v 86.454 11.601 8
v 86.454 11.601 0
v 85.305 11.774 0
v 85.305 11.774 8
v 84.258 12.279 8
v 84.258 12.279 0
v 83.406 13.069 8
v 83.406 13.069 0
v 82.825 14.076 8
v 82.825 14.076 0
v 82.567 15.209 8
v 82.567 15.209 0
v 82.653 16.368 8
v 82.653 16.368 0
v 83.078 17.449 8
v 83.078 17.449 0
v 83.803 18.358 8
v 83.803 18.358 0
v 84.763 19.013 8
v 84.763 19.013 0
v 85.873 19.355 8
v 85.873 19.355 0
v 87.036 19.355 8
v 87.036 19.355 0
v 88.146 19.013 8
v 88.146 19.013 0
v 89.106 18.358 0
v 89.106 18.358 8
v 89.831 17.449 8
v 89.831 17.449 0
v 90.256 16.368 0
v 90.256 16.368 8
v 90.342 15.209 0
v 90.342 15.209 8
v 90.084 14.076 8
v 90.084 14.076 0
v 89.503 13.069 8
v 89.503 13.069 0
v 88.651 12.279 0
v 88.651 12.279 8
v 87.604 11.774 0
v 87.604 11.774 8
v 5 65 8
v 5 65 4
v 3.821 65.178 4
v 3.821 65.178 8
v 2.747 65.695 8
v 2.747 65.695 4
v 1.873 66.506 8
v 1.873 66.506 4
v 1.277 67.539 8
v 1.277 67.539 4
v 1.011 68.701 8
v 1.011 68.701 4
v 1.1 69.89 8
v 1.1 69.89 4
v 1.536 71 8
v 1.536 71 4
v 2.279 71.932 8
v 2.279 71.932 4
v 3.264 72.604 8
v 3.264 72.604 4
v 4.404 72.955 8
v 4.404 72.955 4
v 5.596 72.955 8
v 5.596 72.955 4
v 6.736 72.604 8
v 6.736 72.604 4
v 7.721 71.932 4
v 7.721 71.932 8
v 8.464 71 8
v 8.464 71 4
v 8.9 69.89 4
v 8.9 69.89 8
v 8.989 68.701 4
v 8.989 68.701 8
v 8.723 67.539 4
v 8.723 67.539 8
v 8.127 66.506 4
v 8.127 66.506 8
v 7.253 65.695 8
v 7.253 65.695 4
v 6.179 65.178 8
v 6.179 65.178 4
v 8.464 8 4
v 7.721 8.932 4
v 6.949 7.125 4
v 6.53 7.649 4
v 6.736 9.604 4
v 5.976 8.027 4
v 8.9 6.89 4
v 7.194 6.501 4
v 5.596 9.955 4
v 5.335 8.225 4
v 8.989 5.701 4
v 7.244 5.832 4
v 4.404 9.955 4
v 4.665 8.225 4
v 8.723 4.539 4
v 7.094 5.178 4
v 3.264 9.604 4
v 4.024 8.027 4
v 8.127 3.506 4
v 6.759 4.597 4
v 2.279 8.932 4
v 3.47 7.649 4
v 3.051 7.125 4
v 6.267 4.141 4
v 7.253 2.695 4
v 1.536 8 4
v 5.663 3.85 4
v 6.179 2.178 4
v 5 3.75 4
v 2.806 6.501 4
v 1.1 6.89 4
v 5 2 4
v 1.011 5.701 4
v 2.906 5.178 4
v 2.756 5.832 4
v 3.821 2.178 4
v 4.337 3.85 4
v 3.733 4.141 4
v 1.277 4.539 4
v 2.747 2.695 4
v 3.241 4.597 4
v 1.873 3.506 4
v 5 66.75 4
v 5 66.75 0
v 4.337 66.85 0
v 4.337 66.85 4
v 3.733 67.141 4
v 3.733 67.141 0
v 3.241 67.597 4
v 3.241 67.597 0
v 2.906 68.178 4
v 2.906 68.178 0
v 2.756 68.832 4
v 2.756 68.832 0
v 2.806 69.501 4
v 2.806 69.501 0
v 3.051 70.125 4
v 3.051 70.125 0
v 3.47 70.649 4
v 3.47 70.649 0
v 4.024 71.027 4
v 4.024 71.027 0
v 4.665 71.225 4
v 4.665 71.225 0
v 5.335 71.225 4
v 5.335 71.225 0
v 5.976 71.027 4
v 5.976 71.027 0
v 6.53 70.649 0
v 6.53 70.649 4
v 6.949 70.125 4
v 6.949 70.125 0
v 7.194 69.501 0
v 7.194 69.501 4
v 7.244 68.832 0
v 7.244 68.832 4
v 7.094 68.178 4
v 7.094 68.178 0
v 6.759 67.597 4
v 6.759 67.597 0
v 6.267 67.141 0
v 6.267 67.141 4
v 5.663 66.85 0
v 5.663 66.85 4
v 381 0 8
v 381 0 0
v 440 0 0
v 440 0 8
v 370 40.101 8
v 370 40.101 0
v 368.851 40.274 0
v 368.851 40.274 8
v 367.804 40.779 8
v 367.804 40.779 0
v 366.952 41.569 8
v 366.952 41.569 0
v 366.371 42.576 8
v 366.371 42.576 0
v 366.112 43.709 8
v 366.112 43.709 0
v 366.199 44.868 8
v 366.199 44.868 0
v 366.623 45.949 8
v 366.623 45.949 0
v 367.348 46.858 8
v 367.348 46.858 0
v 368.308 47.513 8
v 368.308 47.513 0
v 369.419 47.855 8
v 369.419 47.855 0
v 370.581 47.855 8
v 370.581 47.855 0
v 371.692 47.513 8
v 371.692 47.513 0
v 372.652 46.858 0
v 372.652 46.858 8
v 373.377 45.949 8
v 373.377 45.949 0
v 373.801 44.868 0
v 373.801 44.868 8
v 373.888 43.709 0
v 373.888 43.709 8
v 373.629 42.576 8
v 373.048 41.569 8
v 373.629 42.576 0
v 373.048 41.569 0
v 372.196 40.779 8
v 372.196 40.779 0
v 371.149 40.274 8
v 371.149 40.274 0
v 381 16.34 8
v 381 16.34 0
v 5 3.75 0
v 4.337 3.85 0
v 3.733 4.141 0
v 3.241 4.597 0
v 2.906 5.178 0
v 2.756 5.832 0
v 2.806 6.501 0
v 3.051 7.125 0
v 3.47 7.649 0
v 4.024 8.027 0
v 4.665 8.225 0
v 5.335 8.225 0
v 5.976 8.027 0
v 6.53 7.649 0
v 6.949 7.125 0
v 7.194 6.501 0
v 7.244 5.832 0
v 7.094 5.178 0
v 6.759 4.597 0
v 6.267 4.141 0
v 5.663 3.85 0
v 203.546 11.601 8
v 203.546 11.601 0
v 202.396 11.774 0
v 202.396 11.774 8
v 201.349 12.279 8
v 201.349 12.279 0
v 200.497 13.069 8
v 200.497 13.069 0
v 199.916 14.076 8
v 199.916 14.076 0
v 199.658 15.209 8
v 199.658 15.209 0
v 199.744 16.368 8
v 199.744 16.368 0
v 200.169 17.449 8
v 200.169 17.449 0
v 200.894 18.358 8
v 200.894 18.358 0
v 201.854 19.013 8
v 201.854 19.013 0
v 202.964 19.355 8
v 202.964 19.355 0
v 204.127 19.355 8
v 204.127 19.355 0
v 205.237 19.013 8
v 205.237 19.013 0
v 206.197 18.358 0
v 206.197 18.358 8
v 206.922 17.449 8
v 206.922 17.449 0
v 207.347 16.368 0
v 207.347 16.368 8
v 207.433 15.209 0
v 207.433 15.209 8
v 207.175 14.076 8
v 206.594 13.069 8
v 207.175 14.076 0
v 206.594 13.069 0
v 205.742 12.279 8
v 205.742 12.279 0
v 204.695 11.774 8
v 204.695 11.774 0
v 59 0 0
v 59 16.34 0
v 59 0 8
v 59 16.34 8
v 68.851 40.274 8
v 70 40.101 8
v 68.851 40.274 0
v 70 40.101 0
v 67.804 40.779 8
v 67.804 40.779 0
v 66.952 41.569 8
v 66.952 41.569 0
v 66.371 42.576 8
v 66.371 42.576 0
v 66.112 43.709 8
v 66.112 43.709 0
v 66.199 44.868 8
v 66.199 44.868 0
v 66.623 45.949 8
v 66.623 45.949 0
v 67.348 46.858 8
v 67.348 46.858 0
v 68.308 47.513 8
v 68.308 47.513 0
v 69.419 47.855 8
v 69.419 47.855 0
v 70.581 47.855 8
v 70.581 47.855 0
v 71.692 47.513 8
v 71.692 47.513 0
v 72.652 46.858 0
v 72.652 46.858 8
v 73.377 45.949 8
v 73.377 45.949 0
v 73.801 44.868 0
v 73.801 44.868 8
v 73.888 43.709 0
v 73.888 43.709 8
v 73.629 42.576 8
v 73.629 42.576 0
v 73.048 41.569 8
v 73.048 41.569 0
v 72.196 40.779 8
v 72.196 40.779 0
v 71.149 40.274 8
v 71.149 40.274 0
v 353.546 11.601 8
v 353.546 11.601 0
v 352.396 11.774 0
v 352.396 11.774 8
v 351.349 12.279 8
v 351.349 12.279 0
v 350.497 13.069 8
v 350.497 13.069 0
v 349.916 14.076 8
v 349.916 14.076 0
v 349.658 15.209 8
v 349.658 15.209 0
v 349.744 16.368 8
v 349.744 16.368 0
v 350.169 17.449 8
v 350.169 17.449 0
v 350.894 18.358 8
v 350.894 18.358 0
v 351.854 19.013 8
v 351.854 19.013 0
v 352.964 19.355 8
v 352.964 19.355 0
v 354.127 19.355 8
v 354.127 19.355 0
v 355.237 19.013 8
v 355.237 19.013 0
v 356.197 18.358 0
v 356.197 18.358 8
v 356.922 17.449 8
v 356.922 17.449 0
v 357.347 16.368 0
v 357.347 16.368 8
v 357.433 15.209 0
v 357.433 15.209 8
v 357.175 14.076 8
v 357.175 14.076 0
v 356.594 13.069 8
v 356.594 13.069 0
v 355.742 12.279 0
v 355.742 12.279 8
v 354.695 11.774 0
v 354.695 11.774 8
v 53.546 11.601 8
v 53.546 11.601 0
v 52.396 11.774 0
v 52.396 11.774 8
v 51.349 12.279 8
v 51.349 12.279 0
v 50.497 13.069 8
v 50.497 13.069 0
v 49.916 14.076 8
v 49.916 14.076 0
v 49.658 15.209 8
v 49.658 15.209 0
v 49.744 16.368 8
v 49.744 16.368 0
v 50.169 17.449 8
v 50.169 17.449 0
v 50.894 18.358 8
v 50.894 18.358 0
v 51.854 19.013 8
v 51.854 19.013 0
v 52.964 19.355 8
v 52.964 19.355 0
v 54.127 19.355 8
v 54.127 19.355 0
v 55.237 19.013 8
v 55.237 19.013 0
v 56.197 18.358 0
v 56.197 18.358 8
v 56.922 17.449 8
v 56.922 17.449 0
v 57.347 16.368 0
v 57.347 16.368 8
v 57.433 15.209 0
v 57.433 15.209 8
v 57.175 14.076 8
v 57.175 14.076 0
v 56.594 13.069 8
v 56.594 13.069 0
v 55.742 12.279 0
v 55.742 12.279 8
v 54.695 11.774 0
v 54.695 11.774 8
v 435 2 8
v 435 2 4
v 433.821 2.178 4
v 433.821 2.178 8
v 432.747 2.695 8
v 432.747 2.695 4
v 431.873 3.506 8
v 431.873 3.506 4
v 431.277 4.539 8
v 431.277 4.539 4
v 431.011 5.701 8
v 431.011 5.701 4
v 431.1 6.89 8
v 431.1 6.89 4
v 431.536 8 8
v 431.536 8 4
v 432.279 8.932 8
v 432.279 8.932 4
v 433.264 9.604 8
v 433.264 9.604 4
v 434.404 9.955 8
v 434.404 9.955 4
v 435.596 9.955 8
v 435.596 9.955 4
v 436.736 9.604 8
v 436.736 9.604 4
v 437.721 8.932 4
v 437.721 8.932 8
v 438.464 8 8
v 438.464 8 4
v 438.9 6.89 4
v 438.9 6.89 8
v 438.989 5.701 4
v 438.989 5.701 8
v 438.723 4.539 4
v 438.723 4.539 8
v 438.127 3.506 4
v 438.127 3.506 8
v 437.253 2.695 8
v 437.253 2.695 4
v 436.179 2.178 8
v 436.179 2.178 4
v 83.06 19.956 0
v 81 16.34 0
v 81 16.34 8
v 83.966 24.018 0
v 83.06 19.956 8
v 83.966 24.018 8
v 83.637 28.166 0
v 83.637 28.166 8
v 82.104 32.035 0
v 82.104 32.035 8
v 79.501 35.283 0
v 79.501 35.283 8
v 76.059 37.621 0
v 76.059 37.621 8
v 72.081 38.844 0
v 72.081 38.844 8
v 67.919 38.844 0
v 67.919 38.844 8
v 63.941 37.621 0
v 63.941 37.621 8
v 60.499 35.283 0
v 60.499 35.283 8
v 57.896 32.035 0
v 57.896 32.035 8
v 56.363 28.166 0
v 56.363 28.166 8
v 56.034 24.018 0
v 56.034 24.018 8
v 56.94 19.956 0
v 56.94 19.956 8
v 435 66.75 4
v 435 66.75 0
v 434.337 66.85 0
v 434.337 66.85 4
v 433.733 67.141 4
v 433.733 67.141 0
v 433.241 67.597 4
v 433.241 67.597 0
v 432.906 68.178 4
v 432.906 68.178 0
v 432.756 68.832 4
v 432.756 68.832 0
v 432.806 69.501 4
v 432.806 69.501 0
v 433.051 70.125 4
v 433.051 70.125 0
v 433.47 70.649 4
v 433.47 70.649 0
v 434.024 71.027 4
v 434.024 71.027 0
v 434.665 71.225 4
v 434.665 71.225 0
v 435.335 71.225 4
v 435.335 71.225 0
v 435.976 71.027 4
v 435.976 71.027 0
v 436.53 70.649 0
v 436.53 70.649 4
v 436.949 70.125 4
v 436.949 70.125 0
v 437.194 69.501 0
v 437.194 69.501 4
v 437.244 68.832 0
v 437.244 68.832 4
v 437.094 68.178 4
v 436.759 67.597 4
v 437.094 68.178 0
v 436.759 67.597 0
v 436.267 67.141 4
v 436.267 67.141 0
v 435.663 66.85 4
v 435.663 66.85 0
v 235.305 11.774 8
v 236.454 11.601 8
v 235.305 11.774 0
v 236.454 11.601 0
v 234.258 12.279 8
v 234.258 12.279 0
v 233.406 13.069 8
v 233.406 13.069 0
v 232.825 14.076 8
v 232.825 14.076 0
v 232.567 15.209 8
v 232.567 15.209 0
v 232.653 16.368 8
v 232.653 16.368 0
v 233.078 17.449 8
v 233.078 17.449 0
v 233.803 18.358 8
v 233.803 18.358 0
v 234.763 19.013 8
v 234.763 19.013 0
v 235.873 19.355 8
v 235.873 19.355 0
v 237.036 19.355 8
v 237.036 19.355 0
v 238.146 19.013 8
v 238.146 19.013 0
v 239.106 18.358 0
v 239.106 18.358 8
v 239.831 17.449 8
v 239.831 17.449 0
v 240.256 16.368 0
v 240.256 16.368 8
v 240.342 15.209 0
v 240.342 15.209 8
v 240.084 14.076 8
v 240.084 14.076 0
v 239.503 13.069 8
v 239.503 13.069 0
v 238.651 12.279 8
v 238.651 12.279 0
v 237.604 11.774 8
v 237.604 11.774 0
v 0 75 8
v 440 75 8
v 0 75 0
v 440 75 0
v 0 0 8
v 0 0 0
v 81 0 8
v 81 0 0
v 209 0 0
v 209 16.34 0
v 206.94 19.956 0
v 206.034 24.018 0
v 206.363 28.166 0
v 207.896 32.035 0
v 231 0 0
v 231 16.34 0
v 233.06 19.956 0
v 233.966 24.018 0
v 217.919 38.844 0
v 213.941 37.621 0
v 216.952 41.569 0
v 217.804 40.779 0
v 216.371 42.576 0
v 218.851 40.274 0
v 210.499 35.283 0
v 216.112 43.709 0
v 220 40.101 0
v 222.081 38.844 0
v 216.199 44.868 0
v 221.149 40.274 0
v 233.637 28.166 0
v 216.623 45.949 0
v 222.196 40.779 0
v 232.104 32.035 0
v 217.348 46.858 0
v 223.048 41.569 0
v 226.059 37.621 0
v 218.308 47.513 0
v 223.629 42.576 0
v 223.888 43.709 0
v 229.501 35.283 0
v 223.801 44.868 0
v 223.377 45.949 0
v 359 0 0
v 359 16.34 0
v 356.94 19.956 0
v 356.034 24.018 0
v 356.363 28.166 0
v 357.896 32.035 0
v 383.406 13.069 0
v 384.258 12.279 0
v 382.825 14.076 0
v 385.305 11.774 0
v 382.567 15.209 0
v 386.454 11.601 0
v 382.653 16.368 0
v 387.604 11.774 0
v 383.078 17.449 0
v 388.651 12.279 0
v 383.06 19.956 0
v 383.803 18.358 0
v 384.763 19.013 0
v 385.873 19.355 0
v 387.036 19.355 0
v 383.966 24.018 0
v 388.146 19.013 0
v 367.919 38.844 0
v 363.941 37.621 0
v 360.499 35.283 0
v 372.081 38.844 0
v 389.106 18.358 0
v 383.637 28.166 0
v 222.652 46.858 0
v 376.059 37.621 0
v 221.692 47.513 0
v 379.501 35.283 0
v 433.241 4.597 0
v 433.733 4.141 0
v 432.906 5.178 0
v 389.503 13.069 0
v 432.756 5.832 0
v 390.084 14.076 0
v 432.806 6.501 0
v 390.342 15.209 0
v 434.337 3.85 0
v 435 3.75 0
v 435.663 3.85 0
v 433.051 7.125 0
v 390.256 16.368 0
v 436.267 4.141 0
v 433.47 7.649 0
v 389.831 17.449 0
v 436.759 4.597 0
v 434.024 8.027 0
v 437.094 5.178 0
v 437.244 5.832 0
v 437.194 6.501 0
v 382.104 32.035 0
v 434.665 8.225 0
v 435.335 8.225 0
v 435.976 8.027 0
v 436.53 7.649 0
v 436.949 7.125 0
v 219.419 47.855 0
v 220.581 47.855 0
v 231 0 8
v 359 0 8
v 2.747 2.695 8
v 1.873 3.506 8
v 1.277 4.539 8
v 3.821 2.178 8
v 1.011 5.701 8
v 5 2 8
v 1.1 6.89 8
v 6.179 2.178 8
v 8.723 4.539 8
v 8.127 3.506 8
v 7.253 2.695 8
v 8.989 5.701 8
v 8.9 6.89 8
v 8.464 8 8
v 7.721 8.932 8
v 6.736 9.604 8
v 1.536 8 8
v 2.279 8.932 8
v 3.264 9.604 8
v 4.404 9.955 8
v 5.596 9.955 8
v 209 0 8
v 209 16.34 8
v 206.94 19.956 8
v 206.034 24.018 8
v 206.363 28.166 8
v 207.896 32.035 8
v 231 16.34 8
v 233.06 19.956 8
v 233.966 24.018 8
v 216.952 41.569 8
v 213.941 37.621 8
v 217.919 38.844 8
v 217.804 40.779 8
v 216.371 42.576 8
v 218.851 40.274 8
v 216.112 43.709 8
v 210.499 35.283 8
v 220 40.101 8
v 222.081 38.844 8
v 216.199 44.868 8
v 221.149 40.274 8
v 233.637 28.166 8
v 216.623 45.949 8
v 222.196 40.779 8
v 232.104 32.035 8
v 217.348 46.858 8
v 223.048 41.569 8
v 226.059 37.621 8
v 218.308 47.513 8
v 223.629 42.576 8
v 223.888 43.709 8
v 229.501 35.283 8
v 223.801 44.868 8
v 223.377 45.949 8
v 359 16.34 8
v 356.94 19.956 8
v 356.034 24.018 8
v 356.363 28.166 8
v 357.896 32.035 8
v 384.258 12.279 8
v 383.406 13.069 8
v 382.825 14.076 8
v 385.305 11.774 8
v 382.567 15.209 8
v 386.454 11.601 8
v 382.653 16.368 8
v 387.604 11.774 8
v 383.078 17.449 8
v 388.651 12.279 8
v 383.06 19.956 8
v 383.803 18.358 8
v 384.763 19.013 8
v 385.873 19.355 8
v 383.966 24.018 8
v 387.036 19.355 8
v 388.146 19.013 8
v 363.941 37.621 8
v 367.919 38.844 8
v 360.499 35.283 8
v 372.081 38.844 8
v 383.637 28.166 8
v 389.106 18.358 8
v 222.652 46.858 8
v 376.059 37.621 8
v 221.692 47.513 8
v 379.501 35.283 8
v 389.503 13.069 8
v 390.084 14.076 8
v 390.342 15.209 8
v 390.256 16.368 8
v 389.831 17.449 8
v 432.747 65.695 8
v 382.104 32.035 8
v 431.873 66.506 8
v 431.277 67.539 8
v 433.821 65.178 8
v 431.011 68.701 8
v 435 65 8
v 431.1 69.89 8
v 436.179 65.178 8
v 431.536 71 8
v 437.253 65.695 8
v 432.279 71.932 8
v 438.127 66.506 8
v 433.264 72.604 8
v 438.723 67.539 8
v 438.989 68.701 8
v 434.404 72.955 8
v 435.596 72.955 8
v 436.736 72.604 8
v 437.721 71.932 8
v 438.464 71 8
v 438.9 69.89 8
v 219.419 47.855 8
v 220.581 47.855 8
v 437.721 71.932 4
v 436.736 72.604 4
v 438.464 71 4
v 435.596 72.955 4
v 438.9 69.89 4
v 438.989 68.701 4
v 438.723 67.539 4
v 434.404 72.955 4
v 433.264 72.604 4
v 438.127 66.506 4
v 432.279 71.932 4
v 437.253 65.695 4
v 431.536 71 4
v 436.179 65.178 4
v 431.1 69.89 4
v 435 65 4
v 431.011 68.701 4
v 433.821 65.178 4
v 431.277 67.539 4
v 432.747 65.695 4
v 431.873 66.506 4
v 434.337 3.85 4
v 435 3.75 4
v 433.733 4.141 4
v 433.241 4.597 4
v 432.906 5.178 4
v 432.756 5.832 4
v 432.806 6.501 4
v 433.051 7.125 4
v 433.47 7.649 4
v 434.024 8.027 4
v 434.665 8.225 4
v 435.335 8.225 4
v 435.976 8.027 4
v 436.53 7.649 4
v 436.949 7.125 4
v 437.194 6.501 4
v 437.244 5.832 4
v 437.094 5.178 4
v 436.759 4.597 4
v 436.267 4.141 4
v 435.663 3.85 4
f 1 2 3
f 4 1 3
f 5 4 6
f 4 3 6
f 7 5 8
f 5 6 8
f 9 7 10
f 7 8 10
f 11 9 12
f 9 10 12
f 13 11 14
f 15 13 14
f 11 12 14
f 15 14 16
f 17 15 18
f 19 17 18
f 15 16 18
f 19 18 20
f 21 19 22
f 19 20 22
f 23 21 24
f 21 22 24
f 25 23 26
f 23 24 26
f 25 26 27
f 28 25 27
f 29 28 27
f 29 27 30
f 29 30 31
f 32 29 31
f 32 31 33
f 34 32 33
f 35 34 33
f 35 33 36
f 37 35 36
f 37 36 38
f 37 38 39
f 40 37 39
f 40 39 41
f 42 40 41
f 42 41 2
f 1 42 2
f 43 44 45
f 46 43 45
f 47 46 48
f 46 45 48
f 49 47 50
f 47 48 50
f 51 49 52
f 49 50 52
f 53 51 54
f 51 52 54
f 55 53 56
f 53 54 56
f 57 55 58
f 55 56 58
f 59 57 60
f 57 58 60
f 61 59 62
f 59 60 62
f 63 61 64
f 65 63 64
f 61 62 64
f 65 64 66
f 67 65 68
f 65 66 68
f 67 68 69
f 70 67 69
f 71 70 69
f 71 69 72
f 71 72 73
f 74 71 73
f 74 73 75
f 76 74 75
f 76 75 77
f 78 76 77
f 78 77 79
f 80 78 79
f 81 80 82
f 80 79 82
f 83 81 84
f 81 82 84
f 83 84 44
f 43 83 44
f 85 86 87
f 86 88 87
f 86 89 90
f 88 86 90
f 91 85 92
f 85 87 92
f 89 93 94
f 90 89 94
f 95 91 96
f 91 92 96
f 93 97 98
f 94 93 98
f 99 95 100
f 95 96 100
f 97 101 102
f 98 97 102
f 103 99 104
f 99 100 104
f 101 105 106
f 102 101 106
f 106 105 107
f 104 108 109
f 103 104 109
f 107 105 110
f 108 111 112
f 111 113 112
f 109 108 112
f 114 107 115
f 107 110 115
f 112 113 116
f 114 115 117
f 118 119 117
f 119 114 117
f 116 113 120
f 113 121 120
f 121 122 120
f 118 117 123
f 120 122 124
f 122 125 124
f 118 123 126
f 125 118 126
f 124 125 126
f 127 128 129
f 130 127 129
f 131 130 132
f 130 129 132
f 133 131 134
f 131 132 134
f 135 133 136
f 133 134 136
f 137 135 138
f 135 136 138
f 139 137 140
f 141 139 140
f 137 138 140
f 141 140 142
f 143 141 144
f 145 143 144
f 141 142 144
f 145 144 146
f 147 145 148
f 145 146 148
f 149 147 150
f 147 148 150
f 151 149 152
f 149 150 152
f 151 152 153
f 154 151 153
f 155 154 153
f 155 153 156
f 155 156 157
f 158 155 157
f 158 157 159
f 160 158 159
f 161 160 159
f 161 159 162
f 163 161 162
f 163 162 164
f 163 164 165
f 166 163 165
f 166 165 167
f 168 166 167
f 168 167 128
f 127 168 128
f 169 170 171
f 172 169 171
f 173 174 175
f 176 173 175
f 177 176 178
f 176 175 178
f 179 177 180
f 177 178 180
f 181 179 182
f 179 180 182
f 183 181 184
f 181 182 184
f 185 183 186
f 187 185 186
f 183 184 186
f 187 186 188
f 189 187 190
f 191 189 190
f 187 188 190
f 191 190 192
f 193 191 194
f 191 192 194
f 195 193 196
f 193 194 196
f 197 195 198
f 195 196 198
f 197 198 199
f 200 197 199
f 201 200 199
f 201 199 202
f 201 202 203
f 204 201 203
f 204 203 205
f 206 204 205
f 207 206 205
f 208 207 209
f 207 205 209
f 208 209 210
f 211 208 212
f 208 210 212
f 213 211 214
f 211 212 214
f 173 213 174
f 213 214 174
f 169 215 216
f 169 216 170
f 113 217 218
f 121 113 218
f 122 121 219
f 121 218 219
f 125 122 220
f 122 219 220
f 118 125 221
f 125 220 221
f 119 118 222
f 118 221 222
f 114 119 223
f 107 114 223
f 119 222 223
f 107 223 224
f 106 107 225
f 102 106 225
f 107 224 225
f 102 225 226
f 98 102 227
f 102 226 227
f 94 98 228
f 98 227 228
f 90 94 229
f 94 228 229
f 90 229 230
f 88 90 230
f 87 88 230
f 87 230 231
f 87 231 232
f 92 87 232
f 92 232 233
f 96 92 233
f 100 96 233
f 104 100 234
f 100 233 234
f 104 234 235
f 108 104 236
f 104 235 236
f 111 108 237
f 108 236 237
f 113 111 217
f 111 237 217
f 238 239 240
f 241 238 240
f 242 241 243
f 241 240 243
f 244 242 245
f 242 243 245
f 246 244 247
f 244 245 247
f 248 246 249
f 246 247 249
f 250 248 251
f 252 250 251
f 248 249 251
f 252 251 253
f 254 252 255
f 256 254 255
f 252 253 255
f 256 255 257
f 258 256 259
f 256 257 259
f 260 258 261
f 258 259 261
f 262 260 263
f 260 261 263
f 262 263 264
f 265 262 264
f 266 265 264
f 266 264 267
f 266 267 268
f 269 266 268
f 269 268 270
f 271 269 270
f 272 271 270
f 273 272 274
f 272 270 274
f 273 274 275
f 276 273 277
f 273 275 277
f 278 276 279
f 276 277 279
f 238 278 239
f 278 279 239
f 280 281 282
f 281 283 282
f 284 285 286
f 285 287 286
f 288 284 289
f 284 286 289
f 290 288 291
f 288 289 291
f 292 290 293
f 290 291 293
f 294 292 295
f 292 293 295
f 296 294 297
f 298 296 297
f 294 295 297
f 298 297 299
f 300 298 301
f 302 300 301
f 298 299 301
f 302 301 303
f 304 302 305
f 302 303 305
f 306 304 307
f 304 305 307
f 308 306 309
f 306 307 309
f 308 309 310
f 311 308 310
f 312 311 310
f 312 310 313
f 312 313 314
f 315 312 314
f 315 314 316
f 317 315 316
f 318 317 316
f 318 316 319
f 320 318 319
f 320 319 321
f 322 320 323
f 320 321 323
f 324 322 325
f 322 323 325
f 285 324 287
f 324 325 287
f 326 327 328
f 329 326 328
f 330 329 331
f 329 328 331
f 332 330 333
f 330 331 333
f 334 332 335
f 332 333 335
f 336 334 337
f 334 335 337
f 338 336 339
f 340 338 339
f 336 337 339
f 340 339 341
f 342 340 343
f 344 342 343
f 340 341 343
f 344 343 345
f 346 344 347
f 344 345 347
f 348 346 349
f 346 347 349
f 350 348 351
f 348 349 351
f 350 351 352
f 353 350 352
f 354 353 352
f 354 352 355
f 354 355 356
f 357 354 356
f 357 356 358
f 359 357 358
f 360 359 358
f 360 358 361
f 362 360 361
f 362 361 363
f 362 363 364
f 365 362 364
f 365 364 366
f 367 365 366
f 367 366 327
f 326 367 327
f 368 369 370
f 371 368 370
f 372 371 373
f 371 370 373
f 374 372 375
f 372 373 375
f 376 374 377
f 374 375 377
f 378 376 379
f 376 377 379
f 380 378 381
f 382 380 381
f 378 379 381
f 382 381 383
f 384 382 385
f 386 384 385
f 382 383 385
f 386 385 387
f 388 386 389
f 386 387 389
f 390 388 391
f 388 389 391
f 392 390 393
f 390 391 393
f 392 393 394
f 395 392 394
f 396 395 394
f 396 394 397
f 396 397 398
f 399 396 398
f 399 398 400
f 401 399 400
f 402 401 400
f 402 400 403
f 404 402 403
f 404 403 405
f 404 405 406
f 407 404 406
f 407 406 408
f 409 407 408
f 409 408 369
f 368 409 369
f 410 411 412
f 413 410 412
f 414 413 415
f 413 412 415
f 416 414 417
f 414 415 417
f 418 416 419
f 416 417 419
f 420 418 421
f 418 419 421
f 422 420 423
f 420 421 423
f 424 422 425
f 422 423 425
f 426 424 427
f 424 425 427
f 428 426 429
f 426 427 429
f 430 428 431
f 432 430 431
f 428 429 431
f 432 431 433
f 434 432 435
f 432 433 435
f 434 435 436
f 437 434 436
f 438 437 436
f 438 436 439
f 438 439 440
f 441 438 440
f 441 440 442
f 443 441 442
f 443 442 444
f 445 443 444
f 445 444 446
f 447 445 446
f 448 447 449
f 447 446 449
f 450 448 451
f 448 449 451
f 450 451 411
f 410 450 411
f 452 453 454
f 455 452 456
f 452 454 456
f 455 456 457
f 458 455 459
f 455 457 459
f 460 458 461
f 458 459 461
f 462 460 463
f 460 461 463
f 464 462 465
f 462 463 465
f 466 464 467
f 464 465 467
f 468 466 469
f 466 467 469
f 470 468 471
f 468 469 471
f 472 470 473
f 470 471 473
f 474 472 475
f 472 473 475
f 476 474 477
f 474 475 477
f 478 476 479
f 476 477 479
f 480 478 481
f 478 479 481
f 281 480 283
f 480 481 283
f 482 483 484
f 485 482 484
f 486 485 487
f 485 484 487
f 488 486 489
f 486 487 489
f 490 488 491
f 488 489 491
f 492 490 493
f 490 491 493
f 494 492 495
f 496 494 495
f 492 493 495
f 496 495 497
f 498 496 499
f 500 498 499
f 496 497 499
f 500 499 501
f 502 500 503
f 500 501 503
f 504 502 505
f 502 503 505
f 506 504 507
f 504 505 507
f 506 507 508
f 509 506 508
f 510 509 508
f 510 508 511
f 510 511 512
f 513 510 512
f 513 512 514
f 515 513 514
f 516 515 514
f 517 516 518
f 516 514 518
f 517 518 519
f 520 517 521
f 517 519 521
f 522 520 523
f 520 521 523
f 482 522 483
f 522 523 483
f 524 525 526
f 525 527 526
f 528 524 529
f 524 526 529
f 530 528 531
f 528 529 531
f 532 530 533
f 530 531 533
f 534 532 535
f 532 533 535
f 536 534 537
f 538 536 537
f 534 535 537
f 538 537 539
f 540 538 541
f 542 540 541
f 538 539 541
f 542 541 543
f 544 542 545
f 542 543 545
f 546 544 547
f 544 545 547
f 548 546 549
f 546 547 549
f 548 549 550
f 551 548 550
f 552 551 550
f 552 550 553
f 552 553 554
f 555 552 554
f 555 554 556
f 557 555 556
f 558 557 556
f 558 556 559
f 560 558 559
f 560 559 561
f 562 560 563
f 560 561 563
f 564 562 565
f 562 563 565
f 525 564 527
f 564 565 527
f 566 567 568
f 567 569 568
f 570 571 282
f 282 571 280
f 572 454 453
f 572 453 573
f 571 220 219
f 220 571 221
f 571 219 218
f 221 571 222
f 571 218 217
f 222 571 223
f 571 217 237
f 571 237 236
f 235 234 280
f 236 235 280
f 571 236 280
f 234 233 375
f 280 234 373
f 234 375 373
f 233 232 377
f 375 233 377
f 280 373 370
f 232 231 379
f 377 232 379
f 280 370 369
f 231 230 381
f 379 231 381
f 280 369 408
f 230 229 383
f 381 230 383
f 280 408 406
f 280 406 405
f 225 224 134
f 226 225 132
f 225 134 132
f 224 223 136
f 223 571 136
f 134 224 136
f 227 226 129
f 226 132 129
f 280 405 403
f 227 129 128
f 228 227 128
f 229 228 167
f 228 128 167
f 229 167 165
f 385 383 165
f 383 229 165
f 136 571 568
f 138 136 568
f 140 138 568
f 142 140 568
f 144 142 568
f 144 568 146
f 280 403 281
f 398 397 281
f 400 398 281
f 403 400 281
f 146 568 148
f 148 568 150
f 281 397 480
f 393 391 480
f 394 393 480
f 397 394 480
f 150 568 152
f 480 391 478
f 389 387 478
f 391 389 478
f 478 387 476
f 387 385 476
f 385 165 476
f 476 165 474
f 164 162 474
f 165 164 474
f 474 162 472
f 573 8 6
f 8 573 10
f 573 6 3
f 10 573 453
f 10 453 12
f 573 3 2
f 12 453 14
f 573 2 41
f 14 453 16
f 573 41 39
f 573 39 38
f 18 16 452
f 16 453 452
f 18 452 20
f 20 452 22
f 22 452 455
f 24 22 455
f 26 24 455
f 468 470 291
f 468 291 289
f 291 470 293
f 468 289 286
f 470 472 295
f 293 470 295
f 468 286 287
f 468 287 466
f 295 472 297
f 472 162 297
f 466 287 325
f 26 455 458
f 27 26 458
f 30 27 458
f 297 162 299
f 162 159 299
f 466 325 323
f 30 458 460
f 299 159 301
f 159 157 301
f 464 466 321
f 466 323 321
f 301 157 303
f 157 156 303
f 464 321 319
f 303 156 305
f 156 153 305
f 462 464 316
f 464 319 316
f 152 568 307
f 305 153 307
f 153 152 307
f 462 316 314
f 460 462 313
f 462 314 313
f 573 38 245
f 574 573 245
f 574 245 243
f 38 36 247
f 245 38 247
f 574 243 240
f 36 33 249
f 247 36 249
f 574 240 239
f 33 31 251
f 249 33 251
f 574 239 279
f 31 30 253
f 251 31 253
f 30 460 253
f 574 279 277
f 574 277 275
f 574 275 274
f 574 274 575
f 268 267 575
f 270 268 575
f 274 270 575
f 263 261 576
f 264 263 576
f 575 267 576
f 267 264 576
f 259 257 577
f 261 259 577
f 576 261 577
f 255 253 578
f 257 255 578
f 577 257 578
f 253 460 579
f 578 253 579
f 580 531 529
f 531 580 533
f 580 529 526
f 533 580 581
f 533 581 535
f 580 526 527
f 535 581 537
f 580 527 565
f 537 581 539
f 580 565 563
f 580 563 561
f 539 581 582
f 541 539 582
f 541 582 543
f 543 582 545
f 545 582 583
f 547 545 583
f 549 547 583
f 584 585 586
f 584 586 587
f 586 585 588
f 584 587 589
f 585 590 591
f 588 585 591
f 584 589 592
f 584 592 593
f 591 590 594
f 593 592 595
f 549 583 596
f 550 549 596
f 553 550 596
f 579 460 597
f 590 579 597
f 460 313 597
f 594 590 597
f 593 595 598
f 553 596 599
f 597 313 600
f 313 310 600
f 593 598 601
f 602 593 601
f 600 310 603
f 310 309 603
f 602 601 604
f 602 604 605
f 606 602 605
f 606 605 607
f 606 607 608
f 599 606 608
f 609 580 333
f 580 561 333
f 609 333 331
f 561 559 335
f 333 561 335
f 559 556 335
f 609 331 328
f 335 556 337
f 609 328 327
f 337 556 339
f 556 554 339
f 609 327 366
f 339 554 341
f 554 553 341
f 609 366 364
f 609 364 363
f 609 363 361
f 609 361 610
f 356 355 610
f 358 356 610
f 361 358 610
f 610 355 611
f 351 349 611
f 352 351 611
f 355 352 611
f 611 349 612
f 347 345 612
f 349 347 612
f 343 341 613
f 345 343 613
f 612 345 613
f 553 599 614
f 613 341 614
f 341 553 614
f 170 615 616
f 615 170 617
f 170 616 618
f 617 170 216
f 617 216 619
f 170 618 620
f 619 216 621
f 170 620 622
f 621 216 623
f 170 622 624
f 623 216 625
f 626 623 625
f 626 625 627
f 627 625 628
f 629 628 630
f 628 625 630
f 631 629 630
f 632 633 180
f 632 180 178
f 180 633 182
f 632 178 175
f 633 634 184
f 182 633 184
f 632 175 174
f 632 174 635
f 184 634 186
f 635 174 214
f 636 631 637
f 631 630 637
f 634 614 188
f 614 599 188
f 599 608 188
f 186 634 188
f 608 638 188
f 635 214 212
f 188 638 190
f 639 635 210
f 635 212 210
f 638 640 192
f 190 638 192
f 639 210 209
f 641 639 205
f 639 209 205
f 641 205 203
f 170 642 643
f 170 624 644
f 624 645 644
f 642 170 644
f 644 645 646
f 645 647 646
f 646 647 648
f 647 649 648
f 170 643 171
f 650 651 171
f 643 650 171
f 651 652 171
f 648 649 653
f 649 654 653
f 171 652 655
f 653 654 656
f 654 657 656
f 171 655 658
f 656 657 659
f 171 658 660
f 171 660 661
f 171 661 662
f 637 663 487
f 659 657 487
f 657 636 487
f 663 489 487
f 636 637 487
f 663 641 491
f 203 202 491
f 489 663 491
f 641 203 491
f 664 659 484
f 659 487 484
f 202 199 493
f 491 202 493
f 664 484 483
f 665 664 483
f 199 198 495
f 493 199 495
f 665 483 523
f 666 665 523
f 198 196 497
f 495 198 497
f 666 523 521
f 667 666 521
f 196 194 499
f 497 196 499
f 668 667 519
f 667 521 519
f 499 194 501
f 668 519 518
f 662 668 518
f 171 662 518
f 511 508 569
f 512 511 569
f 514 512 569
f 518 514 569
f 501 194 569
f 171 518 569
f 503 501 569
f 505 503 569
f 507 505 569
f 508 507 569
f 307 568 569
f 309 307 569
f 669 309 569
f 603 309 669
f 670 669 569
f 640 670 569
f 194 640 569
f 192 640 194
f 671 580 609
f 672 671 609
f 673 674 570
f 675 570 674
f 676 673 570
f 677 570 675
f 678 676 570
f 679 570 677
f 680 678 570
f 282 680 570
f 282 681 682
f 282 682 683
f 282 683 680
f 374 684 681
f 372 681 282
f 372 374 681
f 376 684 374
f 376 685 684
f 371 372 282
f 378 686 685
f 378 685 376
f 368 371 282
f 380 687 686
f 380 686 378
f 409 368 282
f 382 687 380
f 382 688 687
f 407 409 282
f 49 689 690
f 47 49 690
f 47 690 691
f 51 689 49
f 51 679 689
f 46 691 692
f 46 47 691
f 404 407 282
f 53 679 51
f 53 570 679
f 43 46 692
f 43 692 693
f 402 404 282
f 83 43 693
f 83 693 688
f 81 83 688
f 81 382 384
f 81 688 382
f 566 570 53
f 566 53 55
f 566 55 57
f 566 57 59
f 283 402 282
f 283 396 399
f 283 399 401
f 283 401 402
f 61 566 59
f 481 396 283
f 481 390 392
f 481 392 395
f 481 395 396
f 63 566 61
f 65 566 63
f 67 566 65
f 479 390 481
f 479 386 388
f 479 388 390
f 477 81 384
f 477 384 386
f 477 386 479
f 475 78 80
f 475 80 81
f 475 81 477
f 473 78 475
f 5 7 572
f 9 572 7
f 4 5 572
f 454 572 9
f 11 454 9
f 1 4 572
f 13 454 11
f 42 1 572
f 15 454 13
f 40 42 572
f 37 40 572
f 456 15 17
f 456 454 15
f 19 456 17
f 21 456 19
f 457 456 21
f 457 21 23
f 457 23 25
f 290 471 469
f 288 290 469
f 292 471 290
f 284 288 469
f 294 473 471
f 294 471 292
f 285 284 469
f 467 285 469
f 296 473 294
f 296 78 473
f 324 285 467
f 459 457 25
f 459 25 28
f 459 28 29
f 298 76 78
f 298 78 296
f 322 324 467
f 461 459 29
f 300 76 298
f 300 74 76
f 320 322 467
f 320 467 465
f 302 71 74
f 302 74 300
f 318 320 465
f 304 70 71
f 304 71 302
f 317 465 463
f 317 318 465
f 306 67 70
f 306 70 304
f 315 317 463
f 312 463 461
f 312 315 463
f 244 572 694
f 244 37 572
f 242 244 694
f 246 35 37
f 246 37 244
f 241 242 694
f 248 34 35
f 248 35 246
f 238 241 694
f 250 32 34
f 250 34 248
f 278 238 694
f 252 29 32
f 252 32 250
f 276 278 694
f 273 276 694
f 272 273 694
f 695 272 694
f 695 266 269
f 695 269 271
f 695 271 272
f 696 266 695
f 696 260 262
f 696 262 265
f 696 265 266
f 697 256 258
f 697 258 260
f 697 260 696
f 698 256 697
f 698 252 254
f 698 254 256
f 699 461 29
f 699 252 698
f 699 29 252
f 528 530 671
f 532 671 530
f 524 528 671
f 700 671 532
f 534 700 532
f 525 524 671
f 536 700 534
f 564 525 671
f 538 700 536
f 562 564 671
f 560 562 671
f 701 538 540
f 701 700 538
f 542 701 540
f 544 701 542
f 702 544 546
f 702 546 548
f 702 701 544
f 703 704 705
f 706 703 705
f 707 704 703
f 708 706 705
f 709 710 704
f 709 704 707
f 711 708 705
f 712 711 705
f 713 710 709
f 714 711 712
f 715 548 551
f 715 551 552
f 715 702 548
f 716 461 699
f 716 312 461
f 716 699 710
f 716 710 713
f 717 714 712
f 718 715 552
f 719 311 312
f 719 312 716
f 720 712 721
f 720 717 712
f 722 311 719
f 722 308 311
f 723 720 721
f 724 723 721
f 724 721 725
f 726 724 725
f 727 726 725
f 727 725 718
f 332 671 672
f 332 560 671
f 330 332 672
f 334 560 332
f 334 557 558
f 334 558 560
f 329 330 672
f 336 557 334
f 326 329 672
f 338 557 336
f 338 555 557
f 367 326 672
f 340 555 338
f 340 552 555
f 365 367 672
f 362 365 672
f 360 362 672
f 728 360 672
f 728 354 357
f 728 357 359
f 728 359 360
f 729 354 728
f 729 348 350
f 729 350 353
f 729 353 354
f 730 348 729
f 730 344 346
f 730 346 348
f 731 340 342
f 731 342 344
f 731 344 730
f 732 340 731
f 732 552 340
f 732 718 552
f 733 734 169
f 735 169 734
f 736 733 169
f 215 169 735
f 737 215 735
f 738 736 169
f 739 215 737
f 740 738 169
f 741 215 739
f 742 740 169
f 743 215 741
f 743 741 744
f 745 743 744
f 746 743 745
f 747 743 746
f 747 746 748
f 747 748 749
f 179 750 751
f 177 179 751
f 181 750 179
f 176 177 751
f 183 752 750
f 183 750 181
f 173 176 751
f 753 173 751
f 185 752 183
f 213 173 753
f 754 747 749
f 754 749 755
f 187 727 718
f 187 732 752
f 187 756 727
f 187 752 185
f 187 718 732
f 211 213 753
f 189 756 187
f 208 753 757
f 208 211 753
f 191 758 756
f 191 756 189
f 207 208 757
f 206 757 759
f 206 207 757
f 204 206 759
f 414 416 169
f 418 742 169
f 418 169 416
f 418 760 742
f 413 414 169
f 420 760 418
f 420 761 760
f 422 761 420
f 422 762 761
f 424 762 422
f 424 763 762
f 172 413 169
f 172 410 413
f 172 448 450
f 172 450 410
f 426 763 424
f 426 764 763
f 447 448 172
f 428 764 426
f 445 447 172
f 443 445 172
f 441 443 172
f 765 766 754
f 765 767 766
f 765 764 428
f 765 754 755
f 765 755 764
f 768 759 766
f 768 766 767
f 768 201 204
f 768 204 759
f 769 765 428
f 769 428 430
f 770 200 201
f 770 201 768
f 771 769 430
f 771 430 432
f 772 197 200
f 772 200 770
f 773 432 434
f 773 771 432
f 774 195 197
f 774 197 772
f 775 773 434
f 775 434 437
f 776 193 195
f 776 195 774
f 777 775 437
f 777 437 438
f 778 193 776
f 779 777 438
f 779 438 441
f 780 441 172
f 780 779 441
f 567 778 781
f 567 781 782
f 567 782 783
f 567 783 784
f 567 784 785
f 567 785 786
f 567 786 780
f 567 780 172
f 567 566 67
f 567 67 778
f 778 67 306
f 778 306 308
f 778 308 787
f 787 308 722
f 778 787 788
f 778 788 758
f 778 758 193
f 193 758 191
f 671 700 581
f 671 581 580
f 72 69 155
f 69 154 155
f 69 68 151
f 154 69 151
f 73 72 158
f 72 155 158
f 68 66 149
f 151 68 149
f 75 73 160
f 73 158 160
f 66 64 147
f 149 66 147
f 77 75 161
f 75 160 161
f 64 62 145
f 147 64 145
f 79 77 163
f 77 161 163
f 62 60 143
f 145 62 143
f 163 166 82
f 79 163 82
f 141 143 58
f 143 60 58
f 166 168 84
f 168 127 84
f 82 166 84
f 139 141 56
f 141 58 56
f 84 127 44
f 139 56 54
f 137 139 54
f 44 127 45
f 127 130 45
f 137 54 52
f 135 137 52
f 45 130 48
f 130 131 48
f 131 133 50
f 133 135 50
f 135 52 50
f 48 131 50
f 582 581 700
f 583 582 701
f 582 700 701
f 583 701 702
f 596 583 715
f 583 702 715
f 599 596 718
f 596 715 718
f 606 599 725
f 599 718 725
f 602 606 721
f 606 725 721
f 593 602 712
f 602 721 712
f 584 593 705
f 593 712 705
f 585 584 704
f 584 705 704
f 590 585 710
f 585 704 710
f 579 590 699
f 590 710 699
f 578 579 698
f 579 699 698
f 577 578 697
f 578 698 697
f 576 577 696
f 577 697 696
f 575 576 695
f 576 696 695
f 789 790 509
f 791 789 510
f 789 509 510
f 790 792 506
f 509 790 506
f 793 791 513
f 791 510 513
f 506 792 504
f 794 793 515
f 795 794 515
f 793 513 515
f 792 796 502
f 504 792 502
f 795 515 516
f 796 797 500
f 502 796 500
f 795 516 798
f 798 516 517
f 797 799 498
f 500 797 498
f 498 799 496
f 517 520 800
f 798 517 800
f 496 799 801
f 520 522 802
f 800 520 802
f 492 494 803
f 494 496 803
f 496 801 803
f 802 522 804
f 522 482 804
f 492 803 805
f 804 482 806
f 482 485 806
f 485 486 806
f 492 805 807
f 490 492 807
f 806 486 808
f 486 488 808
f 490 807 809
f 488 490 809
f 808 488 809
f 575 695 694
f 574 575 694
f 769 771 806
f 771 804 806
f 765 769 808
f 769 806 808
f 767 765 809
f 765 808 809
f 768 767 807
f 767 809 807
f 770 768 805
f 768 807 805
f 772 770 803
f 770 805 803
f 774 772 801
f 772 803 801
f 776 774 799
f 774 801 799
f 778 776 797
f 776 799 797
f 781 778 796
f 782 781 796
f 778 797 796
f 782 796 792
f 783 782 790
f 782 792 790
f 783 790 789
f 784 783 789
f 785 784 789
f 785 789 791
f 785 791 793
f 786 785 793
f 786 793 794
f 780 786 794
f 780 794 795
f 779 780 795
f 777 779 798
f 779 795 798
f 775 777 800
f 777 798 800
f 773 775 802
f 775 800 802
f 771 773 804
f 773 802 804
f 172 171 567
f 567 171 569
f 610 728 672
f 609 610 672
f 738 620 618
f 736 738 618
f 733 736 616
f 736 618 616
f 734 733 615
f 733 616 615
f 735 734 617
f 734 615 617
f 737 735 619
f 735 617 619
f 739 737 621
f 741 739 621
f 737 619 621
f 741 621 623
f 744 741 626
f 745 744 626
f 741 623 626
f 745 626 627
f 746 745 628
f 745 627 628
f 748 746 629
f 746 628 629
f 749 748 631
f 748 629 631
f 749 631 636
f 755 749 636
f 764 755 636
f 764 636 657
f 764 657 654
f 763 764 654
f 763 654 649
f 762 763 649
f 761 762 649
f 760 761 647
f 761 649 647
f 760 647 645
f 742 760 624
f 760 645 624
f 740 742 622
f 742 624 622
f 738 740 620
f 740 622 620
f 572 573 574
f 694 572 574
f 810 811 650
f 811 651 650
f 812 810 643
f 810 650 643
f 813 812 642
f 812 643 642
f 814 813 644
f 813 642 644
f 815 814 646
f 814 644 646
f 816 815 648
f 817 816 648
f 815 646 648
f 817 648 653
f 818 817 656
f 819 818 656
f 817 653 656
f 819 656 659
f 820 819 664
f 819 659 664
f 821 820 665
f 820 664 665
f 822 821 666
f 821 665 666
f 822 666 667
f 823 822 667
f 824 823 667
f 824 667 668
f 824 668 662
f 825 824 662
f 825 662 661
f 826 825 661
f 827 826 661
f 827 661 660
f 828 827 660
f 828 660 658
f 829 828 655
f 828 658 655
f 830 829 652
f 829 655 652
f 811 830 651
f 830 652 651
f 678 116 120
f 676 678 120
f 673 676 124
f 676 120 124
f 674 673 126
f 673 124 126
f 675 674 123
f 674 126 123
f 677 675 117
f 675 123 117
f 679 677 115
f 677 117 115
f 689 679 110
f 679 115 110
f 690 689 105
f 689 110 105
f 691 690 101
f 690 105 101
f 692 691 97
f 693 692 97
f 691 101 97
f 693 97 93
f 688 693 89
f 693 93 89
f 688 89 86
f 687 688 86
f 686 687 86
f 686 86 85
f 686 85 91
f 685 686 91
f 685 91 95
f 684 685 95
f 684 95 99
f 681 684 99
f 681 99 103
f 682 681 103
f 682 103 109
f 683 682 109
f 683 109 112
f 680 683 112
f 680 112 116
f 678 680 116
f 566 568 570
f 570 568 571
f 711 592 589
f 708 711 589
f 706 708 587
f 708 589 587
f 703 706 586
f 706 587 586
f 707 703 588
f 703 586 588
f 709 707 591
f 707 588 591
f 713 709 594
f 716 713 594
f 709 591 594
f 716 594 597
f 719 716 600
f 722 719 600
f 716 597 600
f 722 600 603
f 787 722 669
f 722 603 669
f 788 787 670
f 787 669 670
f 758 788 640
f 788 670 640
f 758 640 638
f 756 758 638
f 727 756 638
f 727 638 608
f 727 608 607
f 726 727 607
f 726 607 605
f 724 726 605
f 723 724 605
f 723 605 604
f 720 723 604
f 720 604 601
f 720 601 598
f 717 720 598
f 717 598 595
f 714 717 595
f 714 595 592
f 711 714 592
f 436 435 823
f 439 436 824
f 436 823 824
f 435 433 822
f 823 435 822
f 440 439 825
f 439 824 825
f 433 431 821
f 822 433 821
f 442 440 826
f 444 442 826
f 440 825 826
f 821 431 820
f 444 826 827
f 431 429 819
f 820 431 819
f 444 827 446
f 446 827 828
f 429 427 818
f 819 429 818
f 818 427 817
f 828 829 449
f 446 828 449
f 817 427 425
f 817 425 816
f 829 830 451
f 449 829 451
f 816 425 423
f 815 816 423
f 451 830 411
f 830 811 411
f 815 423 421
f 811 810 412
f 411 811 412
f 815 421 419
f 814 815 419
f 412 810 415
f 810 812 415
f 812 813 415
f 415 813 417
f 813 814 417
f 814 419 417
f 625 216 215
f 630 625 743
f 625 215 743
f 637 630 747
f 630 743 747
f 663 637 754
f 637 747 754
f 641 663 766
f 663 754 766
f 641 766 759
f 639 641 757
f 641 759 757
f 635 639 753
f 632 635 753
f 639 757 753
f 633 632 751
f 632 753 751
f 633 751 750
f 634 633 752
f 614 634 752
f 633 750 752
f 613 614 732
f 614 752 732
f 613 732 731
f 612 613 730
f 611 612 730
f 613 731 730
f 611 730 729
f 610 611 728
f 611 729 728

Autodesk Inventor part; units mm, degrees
ref_plane "YZ Plane" through (0, 0, 0) normal (1, 0, 0) x (0, 1, 0)
ref_plane "XZ Plane" through (0, 0, 0) normal (0, 1, 0) x (-1, 0, 0)
ref_plane "XY Plane" through (0, 0, 0) normal (0, 0, 1) x (1, 0, 0)
sketch "Sketch1" plane through (0, 0, 0) normal (0, 0, 1) x (1, 0, 0)
  line L0 (0, 0) -> (440, 0)
  line L1 (440, 0) -> (440, 75)
  line L2 (440, 75) -> (0, 75)
  line L3 (0, 75) -> (0, 0)
  dimension "d0" = 75
  dimension "d1" = 440
extrude "Extrusion1" add sketch "Sketch1" along normal blind 8
sketch "Sketch2" plane through (0, 0, 8) normal (0, 0, 1) x (1, 0, 0)
  line L0 (0, 0) -> (0, 75) projected
  line L1 (440, 0) -> (0, 0) projected
  circle A0 centre (70, 25) radius 14
  line L2 (59, 16.3397) -> (59, 0)
  line L3 (81, 16.3397) -> (81, 0)
  circle A1 centre (220, 25) radius 14
  line L4 (209, 16.3397) -> (209, 0)
  line L5 (231, 16.3397) -> (231, 0)
  circle A2 centre (370, 25) radius 14
  line L6 (359, 16.3397) -> (359, 0)
  line L7 (381, 16.3397) -> (381, 0)
  line L8 (209, 0) -> (231, 0)
  line L9 (359, 0) -> (381, 0)
  line L10 (521.97, 0) -> (544.83, 0)
  line L11 (671.8667, 0) -> (697.23, 0)
  line L12 (826.77, 0) -> (849.63, 0)
  line L13 (674.37, 0) -> (697.23, 0)
  dimension "d4" = 22
  dimension "d5" = 11
  dimension "d7" = 25
  dimension "d8" = 28
  dimension "d9" = 70
  dimension "d17" = 150
  dimension "d58" = 440
extrude "Extrusion4" cut sketch "Sketch2" against normal up to next
sketch "Sketch3" plane through (0, 0, 8) normal (0, 0, 1) x (1, 0, 0)
  arc A0 (81, 16.3397) -> (59, 16.3397) centre (70, 25) ccw projected
  circle A1 centre (70, 25) radius 19
  line L0 (209, 0) -> (81, 0) projected
  point P0 (70, 44)
  point P1 (53.5455, 15.5)
  point P2 (86.4545, 15.5)
  point P3 (220, 44)
  point P4 (236.4545, 15.5)
  point P5 (203.5455, 15.5)
  point P6 (370, 44)
  point P7 (386.4545, 15.5)
  point P8 (353.5455, 15.5)
  dimension "d59" = 38
  dimension "d62" = 360
  dimension "d66" = 150
hole "Hole1" at (70, 44, 8) at (86.4545, 15.5, 8) at (53.5455, 15.5, 8) at (203.5455, 15.5, 8) at (236.4545, 15.5, 8) at (220, 44, 8) at (353.5455, 15.5, 8) at (370, 44, 8) at (386.4545, 15.5, 8) direction (0, 0, -1) diameter 7.7978 end through all thread size "3/8-16 UNC" class "2B" standard "ANSI Unified Screw Threads"
sketch "Sketch4" plane through (0, 0, 8) normal (0, 0, 1) x (1, 0, 0)
  line L0 (440, 75) -> (440, 0) projected
  line L1 (0, 0) -> (0, 75) projected
  line L2 (440, 0) -> (0, 0) projected
  point P0 (59, 0)
  point P1 (5, 69)
  point P2 (5, 6)
  point P3 (435, 6)
  point P4 (435, 69)
  dimension "d42" = 6
  dimension "d44" = 5
  dimension "d45" = 5
  dimension "d71" = 69
hole "Hole2" at (5, 69, 8) at (5, 6, 8) at (435, 6, 8) at (435, 69, 8) direction (0, 0, -1) diameter 4.5 end through all counterbore diameter 8 counterbore depth 4 clearance for "Socket Head Cap Screw" size "M4" standard "Ansi Metric M Profile"
equation "\"d4\" = 2 * d5"
equation "\"d9\" = -d17 + 0.5 * d58"
equation "\"d44\" = d45"
properties part number "Top" material "Aluminum-6061"
